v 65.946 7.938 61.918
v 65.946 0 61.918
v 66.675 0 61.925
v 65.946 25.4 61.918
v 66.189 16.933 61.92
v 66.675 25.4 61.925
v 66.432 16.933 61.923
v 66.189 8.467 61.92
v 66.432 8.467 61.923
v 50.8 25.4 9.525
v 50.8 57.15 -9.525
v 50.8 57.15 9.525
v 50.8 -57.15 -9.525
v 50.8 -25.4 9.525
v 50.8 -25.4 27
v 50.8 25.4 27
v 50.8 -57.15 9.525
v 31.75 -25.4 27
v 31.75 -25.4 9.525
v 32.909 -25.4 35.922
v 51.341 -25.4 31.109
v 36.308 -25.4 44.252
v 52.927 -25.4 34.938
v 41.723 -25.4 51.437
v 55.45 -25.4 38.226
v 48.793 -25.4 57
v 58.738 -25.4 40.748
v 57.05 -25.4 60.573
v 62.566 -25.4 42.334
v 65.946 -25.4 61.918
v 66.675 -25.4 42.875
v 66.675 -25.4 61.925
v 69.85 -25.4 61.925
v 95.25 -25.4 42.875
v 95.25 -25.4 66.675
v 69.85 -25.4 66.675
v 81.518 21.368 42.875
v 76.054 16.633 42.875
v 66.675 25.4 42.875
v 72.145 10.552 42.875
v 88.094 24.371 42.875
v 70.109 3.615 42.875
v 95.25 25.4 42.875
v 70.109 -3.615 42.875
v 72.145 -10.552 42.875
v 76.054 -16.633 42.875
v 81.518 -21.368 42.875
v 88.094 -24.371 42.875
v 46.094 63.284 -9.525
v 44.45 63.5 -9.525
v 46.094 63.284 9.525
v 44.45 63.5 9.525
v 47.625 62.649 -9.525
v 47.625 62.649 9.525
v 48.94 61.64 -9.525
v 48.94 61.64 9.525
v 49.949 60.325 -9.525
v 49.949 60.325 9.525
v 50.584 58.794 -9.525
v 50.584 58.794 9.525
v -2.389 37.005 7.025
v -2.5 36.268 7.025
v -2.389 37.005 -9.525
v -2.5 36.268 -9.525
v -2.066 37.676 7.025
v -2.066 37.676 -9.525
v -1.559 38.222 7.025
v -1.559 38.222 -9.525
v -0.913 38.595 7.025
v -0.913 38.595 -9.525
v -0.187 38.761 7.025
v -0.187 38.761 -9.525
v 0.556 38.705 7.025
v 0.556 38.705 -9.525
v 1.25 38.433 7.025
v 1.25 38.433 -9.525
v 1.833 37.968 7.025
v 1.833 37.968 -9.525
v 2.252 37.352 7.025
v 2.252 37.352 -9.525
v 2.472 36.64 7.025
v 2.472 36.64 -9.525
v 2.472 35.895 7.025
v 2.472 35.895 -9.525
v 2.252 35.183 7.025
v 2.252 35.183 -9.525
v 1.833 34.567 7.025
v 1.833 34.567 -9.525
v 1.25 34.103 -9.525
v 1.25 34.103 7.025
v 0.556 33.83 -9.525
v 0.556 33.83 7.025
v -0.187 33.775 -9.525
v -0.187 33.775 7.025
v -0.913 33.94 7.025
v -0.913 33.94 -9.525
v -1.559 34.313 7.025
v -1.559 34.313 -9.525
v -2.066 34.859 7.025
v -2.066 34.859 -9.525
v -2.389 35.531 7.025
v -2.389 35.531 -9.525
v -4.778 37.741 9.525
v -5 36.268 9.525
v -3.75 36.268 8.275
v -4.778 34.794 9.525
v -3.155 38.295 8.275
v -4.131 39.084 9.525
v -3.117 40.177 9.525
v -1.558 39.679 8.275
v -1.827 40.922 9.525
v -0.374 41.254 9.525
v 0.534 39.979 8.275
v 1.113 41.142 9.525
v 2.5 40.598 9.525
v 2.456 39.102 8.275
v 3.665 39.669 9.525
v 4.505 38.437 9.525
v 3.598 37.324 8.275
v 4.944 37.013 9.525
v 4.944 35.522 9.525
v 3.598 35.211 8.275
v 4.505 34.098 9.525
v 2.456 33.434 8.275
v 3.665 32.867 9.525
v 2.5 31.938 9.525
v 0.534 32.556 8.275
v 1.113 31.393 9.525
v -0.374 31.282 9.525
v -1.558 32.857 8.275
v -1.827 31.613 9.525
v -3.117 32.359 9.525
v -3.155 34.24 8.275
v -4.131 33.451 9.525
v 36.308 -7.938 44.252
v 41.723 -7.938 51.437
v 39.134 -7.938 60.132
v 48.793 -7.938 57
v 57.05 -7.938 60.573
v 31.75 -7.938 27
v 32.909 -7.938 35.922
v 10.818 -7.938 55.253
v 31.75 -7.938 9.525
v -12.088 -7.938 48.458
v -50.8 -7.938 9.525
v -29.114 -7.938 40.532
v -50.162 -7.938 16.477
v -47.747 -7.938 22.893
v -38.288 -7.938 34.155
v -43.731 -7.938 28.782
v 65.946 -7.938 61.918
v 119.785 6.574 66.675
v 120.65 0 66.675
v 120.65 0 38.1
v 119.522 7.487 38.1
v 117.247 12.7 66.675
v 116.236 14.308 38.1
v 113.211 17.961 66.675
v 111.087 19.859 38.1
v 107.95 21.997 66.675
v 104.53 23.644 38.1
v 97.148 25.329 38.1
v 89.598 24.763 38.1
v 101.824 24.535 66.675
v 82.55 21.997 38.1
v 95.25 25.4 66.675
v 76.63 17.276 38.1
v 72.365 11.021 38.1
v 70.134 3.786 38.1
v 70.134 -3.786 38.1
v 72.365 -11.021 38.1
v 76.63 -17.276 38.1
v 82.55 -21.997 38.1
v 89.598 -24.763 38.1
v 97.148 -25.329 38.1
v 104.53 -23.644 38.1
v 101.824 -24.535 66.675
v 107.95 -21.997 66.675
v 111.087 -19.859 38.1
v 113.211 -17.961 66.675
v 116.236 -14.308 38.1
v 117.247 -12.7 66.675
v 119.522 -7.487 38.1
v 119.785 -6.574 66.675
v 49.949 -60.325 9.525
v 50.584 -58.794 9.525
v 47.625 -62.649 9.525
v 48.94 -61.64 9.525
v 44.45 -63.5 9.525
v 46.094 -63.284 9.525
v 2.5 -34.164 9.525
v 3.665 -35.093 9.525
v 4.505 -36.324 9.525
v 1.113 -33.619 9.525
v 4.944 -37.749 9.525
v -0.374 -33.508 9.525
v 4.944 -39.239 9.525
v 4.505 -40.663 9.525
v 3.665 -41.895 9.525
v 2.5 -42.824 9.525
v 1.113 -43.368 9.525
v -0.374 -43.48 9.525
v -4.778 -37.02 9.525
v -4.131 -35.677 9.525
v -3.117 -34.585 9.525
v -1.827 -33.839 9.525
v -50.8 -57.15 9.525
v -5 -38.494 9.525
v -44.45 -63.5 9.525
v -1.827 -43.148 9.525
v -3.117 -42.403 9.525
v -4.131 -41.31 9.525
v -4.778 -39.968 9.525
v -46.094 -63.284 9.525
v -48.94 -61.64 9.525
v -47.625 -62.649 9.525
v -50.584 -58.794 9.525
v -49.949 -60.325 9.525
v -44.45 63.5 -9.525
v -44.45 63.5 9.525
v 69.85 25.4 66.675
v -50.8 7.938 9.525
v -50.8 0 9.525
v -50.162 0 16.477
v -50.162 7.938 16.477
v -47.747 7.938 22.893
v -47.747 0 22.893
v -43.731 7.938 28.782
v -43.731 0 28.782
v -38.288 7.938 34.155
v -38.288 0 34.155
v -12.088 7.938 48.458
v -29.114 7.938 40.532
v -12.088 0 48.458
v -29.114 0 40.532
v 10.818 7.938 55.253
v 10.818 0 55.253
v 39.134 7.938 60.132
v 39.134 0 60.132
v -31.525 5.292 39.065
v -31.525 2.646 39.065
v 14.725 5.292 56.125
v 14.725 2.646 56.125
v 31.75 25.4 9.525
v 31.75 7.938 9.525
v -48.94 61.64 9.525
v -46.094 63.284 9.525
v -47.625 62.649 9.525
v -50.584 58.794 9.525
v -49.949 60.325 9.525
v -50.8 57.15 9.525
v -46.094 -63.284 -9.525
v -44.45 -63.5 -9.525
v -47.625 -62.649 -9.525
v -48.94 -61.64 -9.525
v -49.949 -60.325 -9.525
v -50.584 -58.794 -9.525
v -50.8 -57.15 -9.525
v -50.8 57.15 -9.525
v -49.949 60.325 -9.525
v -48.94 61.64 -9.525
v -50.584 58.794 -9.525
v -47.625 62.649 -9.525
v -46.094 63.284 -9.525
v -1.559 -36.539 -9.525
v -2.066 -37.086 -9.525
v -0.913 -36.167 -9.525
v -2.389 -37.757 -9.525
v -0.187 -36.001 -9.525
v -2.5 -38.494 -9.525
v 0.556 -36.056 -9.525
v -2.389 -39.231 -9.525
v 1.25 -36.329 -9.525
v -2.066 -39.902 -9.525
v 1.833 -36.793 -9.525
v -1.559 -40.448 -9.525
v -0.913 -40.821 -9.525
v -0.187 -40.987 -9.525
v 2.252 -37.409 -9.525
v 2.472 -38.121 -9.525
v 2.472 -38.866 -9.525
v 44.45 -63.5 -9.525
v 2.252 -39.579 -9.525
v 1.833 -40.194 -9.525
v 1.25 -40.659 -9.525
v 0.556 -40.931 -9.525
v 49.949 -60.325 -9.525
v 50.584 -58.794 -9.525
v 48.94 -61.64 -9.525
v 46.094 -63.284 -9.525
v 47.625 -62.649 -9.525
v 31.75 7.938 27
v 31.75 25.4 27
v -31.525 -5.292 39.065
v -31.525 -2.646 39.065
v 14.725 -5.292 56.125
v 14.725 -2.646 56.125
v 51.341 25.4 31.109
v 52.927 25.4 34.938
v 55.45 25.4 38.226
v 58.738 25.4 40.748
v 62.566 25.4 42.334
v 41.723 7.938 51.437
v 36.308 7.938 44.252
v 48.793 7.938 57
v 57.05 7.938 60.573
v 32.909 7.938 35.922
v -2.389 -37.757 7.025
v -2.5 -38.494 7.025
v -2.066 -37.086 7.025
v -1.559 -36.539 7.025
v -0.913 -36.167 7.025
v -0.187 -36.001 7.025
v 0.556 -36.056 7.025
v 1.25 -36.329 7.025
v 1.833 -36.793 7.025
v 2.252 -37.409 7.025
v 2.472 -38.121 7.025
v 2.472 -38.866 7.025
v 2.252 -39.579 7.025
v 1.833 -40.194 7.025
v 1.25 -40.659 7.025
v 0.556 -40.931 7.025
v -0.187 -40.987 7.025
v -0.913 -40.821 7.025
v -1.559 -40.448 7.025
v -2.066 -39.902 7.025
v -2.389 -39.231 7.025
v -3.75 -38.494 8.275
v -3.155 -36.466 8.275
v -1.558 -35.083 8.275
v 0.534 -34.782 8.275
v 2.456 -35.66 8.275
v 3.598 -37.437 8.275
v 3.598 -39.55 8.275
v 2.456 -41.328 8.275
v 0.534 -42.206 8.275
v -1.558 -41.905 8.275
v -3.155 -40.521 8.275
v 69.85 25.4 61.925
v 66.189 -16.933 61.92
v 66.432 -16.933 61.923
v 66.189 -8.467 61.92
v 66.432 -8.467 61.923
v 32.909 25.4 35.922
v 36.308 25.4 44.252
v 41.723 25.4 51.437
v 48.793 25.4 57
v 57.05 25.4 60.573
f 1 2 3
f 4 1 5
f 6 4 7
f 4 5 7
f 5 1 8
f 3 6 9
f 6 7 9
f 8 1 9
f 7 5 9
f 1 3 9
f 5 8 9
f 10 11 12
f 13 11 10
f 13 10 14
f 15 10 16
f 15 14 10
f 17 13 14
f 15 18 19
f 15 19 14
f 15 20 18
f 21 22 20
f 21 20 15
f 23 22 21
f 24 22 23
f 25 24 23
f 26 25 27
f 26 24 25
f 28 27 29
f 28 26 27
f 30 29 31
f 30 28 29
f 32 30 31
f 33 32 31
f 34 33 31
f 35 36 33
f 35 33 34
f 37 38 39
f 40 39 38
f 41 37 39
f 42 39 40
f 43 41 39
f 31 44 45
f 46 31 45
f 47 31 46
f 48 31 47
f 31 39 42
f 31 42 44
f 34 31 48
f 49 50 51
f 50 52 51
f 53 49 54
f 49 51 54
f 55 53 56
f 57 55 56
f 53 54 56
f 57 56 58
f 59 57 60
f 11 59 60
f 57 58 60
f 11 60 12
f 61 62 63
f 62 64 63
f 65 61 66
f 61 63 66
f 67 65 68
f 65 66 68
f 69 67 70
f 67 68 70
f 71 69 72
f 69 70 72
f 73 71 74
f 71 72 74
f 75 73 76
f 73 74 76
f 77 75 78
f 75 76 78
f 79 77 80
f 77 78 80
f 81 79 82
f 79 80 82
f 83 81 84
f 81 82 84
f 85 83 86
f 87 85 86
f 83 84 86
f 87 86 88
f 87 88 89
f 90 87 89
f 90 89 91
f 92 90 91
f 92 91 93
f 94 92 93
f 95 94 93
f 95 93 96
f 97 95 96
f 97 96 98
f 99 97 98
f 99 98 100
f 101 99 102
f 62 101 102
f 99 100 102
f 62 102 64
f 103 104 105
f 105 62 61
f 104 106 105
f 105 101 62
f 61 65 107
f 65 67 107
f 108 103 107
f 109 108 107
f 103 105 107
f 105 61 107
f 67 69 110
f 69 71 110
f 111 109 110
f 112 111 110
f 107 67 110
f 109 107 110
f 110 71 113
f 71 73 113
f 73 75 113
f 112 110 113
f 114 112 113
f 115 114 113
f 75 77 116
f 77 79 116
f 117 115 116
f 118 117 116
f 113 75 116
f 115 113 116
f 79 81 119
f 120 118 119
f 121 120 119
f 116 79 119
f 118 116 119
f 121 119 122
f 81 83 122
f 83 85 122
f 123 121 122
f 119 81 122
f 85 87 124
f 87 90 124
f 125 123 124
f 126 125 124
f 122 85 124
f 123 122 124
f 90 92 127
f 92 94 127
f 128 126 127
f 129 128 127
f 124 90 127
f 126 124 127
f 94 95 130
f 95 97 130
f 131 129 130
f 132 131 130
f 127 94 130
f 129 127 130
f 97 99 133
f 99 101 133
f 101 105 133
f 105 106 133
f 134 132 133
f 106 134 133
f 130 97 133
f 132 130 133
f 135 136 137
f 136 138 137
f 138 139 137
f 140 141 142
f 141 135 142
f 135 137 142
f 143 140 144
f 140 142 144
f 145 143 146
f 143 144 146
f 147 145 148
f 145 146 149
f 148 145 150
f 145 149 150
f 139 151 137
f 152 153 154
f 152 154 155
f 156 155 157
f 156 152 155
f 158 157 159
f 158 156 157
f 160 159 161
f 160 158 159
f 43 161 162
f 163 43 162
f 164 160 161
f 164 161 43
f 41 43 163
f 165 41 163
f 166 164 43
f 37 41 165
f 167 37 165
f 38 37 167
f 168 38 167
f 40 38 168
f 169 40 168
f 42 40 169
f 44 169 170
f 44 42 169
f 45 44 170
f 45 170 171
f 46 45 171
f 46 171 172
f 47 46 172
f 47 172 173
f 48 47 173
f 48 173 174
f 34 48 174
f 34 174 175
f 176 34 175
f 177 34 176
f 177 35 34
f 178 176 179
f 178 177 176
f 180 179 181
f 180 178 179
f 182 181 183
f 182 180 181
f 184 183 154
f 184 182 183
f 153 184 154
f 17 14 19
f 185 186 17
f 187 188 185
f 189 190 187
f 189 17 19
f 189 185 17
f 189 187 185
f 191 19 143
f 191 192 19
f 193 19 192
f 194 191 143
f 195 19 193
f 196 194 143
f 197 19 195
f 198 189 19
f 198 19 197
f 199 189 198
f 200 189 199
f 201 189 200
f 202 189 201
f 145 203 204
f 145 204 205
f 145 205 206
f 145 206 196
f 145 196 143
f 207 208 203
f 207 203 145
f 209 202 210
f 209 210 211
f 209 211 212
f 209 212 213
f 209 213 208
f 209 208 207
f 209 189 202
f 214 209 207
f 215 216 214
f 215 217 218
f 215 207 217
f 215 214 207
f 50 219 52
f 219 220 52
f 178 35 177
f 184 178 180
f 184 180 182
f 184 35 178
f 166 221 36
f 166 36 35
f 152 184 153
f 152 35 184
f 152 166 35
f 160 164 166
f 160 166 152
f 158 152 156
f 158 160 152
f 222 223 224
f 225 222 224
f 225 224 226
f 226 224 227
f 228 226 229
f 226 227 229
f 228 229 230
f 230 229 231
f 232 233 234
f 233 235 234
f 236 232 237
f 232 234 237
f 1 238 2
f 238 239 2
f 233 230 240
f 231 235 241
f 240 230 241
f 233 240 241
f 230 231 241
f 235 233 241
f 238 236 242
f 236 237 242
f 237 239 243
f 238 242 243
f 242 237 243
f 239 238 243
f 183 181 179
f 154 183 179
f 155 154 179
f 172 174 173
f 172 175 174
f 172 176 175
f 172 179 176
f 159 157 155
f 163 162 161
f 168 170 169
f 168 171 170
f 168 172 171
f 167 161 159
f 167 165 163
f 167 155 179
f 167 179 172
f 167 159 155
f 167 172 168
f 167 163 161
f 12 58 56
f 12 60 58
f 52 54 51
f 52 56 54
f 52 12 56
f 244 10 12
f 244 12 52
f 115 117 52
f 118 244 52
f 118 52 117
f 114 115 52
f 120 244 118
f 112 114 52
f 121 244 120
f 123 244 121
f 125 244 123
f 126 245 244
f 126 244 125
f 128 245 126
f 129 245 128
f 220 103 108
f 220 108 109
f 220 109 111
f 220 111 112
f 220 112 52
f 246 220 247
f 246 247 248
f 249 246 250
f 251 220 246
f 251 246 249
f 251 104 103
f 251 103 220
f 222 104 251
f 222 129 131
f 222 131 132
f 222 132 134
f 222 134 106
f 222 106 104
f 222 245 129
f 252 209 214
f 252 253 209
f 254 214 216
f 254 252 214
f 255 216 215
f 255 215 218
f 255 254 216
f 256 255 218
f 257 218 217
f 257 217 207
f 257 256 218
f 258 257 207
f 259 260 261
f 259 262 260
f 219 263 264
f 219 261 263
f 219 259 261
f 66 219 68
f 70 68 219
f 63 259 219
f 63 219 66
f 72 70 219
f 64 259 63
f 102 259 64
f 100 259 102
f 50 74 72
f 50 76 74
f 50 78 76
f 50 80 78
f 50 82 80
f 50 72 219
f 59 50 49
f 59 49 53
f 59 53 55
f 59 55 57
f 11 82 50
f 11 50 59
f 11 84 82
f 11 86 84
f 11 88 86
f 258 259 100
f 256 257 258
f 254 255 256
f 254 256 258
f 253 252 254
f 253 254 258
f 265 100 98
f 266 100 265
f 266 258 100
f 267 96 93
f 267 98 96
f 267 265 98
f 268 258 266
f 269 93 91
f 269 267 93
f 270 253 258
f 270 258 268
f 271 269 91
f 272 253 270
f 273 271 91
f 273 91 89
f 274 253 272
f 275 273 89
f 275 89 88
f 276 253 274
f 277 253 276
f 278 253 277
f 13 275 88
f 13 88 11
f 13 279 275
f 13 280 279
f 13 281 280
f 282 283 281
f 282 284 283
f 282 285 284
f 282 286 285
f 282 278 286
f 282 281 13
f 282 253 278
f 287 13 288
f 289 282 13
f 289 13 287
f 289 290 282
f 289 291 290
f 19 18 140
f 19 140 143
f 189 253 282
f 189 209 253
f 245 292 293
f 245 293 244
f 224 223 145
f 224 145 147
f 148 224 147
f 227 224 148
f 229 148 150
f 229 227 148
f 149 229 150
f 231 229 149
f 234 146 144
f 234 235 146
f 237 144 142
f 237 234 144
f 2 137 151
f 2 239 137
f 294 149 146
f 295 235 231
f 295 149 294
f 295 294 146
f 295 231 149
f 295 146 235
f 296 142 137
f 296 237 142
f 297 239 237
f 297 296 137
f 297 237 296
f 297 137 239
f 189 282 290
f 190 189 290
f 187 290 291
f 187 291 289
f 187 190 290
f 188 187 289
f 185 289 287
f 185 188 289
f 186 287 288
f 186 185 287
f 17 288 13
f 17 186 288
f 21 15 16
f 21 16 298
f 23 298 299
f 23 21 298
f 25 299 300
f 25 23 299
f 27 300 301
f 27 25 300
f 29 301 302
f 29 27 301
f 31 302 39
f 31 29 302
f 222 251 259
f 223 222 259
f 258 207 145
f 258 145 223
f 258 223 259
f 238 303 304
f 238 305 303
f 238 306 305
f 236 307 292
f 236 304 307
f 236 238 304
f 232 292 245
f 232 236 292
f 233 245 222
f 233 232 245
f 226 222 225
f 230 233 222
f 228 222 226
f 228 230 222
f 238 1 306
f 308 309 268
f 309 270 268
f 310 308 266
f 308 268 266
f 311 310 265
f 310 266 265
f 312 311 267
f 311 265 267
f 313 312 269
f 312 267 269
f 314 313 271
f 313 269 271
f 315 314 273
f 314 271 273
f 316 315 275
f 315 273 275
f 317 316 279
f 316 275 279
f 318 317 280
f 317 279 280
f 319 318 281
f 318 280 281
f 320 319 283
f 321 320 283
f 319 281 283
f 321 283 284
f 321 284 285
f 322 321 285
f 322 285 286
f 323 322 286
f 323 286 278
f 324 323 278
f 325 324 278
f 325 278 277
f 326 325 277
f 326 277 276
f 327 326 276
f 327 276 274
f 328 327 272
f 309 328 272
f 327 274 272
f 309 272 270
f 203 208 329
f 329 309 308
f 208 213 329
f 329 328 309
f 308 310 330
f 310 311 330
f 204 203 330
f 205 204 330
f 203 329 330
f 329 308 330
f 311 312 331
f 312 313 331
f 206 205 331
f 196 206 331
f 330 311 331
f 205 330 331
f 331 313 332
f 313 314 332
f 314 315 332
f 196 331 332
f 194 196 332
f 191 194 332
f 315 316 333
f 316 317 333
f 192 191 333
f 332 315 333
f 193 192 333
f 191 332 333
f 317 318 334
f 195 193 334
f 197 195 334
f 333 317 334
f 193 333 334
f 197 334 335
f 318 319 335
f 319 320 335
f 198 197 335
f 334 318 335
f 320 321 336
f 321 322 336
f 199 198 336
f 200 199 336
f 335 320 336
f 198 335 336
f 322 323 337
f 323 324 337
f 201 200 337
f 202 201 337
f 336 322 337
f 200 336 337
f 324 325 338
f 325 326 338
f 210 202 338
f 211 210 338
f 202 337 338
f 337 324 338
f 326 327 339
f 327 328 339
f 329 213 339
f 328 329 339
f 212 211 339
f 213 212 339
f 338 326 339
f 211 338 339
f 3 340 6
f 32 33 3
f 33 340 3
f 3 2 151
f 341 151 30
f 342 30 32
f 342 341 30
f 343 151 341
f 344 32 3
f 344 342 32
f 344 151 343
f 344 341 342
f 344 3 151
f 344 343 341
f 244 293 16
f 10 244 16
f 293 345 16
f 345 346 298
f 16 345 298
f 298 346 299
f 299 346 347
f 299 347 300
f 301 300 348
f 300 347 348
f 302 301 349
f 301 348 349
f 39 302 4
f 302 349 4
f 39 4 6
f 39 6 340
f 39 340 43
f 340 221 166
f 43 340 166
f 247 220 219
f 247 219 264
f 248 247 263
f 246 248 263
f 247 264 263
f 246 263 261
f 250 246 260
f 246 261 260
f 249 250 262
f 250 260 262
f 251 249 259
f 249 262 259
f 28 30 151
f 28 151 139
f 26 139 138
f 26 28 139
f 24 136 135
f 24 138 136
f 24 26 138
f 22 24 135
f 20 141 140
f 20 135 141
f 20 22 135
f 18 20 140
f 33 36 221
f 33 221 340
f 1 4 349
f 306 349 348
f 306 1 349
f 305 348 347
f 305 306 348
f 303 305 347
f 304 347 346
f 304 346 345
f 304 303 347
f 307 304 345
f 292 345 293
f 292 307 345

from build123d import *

# Parameters (mm, degrees)
F1_DEPTH       = 63.5
F2_DEPTH       = 25.4
F3_DEPTH       = 7.9375
F5_R           = 6.35
F7_D           = 5
F7_CSINK_D     = 10
F7_CSINK_ANGLE = 90


# Not quite as in the source:
# - a feature names something its author has since deleted; it is built from what else it names


with BuildPart() as f1:
    # F0 (on Front) → F1 (new body, symmetric)
    with BuildSketch(Plane.XZ):
        Polygon((31.75, 9.525), (-50.8, 9.525), (-50.8, -9.525), (50.8, -9.525), (50.8, 9.525), align=None)
    extrude(amount=F1_DEPTH, both=True)

    # F0 (on Front) → F2 (join, symmetric)
    with BuildSketch(Plane.XZ):
        with BuildLine():
            Line((31.75, 27.0002), (31.75, 9.525))
            Line((31.75, 9.525), (50.8, 9.525))
            Line((50.8, 9.525), (50.8, 27.0002))
            ThreePointArc((50.8, 27.0002), (55.4496798487, 38.2255201513), (66.675, 42.8752))
            Line((66.675, 42.8752), (69.85, 42.8752))
            Line((69.85, 42.8752), (69.85, 61.9252))
            Line((69.85, 61.9252), (66.675, 61.9252))
            add(Edge.make_bspline(
                [(65.9455207974, 61.9175808453), (66.1893918553, 61.9205374951), (66.4325563897, 61.9230769491), (66.675, 61.9252)],
                knots=[127.9589342237, 127.9589342237, 127.9589342237, 127.9589342237, 128.6318645789, 128.6318645789, 128.6318645789, 128.6318645789], degree=3))
            ThreePointArc((65.9455207974, 61.9175808453), (41.72271868, 51.4366334944), (31.75, 27.0002))
        make_face()
        Polygon((69.85, 66.675), (69.85, 61.9252), (69.85, 42.8752), (95.25, 42.8752), (95.25, 66.675), align=None)
    extrude(amount=F2_DEPTH, both=True)

    # F0 (on Front) → F3 (join, symmetric)
    with BuildSketch(Plane.XZ):
        with BuildLine():
            add(Edge.make_bspline(
                [(-50.8, 9.525), (-52.3458055459, 45.7083043223), (19.5729944142, 61.3553684788), (65.9455207974, 61.9175808453)],
                knots=[0, 0, 0, 0, 127.9589342237, 127.9589342237, 127.9589342237, 127.9589342237], degree=3))
            Line((-50.8, 9.525), (31.75, 9.525))
            Line((31.75, 9.525), (31.75, 27.0002))
            ThreePointArc((31.75, 27.0002), (41.72271868, 51.4366334944), (65.9455207974, 61.9175808453))
        make_face()
    extrude(amount=F3_DEPTH, both=True)

    # F0 (on Front) → F4 (revolve)
    with BuildSketch(Plane.XZ):
        Polygon((120.65, 66.675), (95.25, 66.675), (95.25, 42.8752), (95.25, 38.1), (120.65, 38.1), align=None)
    revolve(axis=Axis((95.25, 0, 52.3875), (0, 0, 1)))

    # F5
    f5_edges = [f1.edges().sort_by_distance(p)[0] for p in [
        (50.8, -63.5, 0),
        (-50.8, -63.5, 0),
        (-50.8, 63.5, 0),
        (50.8, 63.5, 0),
    ]]
    fillet(f5_edges, radius=F5_R)

    # F7 (through all)
    with Locations(Plane.XY.offset(9.525)):
        with Locations((0, 36.2676680088), (0, -38.4938158095)):
            CounterSinkHole(F7_D / 2, F7_CSINK_D / 2, counter_sink_angle=F7_CSINK_ANGLE)


solid = f1.part
